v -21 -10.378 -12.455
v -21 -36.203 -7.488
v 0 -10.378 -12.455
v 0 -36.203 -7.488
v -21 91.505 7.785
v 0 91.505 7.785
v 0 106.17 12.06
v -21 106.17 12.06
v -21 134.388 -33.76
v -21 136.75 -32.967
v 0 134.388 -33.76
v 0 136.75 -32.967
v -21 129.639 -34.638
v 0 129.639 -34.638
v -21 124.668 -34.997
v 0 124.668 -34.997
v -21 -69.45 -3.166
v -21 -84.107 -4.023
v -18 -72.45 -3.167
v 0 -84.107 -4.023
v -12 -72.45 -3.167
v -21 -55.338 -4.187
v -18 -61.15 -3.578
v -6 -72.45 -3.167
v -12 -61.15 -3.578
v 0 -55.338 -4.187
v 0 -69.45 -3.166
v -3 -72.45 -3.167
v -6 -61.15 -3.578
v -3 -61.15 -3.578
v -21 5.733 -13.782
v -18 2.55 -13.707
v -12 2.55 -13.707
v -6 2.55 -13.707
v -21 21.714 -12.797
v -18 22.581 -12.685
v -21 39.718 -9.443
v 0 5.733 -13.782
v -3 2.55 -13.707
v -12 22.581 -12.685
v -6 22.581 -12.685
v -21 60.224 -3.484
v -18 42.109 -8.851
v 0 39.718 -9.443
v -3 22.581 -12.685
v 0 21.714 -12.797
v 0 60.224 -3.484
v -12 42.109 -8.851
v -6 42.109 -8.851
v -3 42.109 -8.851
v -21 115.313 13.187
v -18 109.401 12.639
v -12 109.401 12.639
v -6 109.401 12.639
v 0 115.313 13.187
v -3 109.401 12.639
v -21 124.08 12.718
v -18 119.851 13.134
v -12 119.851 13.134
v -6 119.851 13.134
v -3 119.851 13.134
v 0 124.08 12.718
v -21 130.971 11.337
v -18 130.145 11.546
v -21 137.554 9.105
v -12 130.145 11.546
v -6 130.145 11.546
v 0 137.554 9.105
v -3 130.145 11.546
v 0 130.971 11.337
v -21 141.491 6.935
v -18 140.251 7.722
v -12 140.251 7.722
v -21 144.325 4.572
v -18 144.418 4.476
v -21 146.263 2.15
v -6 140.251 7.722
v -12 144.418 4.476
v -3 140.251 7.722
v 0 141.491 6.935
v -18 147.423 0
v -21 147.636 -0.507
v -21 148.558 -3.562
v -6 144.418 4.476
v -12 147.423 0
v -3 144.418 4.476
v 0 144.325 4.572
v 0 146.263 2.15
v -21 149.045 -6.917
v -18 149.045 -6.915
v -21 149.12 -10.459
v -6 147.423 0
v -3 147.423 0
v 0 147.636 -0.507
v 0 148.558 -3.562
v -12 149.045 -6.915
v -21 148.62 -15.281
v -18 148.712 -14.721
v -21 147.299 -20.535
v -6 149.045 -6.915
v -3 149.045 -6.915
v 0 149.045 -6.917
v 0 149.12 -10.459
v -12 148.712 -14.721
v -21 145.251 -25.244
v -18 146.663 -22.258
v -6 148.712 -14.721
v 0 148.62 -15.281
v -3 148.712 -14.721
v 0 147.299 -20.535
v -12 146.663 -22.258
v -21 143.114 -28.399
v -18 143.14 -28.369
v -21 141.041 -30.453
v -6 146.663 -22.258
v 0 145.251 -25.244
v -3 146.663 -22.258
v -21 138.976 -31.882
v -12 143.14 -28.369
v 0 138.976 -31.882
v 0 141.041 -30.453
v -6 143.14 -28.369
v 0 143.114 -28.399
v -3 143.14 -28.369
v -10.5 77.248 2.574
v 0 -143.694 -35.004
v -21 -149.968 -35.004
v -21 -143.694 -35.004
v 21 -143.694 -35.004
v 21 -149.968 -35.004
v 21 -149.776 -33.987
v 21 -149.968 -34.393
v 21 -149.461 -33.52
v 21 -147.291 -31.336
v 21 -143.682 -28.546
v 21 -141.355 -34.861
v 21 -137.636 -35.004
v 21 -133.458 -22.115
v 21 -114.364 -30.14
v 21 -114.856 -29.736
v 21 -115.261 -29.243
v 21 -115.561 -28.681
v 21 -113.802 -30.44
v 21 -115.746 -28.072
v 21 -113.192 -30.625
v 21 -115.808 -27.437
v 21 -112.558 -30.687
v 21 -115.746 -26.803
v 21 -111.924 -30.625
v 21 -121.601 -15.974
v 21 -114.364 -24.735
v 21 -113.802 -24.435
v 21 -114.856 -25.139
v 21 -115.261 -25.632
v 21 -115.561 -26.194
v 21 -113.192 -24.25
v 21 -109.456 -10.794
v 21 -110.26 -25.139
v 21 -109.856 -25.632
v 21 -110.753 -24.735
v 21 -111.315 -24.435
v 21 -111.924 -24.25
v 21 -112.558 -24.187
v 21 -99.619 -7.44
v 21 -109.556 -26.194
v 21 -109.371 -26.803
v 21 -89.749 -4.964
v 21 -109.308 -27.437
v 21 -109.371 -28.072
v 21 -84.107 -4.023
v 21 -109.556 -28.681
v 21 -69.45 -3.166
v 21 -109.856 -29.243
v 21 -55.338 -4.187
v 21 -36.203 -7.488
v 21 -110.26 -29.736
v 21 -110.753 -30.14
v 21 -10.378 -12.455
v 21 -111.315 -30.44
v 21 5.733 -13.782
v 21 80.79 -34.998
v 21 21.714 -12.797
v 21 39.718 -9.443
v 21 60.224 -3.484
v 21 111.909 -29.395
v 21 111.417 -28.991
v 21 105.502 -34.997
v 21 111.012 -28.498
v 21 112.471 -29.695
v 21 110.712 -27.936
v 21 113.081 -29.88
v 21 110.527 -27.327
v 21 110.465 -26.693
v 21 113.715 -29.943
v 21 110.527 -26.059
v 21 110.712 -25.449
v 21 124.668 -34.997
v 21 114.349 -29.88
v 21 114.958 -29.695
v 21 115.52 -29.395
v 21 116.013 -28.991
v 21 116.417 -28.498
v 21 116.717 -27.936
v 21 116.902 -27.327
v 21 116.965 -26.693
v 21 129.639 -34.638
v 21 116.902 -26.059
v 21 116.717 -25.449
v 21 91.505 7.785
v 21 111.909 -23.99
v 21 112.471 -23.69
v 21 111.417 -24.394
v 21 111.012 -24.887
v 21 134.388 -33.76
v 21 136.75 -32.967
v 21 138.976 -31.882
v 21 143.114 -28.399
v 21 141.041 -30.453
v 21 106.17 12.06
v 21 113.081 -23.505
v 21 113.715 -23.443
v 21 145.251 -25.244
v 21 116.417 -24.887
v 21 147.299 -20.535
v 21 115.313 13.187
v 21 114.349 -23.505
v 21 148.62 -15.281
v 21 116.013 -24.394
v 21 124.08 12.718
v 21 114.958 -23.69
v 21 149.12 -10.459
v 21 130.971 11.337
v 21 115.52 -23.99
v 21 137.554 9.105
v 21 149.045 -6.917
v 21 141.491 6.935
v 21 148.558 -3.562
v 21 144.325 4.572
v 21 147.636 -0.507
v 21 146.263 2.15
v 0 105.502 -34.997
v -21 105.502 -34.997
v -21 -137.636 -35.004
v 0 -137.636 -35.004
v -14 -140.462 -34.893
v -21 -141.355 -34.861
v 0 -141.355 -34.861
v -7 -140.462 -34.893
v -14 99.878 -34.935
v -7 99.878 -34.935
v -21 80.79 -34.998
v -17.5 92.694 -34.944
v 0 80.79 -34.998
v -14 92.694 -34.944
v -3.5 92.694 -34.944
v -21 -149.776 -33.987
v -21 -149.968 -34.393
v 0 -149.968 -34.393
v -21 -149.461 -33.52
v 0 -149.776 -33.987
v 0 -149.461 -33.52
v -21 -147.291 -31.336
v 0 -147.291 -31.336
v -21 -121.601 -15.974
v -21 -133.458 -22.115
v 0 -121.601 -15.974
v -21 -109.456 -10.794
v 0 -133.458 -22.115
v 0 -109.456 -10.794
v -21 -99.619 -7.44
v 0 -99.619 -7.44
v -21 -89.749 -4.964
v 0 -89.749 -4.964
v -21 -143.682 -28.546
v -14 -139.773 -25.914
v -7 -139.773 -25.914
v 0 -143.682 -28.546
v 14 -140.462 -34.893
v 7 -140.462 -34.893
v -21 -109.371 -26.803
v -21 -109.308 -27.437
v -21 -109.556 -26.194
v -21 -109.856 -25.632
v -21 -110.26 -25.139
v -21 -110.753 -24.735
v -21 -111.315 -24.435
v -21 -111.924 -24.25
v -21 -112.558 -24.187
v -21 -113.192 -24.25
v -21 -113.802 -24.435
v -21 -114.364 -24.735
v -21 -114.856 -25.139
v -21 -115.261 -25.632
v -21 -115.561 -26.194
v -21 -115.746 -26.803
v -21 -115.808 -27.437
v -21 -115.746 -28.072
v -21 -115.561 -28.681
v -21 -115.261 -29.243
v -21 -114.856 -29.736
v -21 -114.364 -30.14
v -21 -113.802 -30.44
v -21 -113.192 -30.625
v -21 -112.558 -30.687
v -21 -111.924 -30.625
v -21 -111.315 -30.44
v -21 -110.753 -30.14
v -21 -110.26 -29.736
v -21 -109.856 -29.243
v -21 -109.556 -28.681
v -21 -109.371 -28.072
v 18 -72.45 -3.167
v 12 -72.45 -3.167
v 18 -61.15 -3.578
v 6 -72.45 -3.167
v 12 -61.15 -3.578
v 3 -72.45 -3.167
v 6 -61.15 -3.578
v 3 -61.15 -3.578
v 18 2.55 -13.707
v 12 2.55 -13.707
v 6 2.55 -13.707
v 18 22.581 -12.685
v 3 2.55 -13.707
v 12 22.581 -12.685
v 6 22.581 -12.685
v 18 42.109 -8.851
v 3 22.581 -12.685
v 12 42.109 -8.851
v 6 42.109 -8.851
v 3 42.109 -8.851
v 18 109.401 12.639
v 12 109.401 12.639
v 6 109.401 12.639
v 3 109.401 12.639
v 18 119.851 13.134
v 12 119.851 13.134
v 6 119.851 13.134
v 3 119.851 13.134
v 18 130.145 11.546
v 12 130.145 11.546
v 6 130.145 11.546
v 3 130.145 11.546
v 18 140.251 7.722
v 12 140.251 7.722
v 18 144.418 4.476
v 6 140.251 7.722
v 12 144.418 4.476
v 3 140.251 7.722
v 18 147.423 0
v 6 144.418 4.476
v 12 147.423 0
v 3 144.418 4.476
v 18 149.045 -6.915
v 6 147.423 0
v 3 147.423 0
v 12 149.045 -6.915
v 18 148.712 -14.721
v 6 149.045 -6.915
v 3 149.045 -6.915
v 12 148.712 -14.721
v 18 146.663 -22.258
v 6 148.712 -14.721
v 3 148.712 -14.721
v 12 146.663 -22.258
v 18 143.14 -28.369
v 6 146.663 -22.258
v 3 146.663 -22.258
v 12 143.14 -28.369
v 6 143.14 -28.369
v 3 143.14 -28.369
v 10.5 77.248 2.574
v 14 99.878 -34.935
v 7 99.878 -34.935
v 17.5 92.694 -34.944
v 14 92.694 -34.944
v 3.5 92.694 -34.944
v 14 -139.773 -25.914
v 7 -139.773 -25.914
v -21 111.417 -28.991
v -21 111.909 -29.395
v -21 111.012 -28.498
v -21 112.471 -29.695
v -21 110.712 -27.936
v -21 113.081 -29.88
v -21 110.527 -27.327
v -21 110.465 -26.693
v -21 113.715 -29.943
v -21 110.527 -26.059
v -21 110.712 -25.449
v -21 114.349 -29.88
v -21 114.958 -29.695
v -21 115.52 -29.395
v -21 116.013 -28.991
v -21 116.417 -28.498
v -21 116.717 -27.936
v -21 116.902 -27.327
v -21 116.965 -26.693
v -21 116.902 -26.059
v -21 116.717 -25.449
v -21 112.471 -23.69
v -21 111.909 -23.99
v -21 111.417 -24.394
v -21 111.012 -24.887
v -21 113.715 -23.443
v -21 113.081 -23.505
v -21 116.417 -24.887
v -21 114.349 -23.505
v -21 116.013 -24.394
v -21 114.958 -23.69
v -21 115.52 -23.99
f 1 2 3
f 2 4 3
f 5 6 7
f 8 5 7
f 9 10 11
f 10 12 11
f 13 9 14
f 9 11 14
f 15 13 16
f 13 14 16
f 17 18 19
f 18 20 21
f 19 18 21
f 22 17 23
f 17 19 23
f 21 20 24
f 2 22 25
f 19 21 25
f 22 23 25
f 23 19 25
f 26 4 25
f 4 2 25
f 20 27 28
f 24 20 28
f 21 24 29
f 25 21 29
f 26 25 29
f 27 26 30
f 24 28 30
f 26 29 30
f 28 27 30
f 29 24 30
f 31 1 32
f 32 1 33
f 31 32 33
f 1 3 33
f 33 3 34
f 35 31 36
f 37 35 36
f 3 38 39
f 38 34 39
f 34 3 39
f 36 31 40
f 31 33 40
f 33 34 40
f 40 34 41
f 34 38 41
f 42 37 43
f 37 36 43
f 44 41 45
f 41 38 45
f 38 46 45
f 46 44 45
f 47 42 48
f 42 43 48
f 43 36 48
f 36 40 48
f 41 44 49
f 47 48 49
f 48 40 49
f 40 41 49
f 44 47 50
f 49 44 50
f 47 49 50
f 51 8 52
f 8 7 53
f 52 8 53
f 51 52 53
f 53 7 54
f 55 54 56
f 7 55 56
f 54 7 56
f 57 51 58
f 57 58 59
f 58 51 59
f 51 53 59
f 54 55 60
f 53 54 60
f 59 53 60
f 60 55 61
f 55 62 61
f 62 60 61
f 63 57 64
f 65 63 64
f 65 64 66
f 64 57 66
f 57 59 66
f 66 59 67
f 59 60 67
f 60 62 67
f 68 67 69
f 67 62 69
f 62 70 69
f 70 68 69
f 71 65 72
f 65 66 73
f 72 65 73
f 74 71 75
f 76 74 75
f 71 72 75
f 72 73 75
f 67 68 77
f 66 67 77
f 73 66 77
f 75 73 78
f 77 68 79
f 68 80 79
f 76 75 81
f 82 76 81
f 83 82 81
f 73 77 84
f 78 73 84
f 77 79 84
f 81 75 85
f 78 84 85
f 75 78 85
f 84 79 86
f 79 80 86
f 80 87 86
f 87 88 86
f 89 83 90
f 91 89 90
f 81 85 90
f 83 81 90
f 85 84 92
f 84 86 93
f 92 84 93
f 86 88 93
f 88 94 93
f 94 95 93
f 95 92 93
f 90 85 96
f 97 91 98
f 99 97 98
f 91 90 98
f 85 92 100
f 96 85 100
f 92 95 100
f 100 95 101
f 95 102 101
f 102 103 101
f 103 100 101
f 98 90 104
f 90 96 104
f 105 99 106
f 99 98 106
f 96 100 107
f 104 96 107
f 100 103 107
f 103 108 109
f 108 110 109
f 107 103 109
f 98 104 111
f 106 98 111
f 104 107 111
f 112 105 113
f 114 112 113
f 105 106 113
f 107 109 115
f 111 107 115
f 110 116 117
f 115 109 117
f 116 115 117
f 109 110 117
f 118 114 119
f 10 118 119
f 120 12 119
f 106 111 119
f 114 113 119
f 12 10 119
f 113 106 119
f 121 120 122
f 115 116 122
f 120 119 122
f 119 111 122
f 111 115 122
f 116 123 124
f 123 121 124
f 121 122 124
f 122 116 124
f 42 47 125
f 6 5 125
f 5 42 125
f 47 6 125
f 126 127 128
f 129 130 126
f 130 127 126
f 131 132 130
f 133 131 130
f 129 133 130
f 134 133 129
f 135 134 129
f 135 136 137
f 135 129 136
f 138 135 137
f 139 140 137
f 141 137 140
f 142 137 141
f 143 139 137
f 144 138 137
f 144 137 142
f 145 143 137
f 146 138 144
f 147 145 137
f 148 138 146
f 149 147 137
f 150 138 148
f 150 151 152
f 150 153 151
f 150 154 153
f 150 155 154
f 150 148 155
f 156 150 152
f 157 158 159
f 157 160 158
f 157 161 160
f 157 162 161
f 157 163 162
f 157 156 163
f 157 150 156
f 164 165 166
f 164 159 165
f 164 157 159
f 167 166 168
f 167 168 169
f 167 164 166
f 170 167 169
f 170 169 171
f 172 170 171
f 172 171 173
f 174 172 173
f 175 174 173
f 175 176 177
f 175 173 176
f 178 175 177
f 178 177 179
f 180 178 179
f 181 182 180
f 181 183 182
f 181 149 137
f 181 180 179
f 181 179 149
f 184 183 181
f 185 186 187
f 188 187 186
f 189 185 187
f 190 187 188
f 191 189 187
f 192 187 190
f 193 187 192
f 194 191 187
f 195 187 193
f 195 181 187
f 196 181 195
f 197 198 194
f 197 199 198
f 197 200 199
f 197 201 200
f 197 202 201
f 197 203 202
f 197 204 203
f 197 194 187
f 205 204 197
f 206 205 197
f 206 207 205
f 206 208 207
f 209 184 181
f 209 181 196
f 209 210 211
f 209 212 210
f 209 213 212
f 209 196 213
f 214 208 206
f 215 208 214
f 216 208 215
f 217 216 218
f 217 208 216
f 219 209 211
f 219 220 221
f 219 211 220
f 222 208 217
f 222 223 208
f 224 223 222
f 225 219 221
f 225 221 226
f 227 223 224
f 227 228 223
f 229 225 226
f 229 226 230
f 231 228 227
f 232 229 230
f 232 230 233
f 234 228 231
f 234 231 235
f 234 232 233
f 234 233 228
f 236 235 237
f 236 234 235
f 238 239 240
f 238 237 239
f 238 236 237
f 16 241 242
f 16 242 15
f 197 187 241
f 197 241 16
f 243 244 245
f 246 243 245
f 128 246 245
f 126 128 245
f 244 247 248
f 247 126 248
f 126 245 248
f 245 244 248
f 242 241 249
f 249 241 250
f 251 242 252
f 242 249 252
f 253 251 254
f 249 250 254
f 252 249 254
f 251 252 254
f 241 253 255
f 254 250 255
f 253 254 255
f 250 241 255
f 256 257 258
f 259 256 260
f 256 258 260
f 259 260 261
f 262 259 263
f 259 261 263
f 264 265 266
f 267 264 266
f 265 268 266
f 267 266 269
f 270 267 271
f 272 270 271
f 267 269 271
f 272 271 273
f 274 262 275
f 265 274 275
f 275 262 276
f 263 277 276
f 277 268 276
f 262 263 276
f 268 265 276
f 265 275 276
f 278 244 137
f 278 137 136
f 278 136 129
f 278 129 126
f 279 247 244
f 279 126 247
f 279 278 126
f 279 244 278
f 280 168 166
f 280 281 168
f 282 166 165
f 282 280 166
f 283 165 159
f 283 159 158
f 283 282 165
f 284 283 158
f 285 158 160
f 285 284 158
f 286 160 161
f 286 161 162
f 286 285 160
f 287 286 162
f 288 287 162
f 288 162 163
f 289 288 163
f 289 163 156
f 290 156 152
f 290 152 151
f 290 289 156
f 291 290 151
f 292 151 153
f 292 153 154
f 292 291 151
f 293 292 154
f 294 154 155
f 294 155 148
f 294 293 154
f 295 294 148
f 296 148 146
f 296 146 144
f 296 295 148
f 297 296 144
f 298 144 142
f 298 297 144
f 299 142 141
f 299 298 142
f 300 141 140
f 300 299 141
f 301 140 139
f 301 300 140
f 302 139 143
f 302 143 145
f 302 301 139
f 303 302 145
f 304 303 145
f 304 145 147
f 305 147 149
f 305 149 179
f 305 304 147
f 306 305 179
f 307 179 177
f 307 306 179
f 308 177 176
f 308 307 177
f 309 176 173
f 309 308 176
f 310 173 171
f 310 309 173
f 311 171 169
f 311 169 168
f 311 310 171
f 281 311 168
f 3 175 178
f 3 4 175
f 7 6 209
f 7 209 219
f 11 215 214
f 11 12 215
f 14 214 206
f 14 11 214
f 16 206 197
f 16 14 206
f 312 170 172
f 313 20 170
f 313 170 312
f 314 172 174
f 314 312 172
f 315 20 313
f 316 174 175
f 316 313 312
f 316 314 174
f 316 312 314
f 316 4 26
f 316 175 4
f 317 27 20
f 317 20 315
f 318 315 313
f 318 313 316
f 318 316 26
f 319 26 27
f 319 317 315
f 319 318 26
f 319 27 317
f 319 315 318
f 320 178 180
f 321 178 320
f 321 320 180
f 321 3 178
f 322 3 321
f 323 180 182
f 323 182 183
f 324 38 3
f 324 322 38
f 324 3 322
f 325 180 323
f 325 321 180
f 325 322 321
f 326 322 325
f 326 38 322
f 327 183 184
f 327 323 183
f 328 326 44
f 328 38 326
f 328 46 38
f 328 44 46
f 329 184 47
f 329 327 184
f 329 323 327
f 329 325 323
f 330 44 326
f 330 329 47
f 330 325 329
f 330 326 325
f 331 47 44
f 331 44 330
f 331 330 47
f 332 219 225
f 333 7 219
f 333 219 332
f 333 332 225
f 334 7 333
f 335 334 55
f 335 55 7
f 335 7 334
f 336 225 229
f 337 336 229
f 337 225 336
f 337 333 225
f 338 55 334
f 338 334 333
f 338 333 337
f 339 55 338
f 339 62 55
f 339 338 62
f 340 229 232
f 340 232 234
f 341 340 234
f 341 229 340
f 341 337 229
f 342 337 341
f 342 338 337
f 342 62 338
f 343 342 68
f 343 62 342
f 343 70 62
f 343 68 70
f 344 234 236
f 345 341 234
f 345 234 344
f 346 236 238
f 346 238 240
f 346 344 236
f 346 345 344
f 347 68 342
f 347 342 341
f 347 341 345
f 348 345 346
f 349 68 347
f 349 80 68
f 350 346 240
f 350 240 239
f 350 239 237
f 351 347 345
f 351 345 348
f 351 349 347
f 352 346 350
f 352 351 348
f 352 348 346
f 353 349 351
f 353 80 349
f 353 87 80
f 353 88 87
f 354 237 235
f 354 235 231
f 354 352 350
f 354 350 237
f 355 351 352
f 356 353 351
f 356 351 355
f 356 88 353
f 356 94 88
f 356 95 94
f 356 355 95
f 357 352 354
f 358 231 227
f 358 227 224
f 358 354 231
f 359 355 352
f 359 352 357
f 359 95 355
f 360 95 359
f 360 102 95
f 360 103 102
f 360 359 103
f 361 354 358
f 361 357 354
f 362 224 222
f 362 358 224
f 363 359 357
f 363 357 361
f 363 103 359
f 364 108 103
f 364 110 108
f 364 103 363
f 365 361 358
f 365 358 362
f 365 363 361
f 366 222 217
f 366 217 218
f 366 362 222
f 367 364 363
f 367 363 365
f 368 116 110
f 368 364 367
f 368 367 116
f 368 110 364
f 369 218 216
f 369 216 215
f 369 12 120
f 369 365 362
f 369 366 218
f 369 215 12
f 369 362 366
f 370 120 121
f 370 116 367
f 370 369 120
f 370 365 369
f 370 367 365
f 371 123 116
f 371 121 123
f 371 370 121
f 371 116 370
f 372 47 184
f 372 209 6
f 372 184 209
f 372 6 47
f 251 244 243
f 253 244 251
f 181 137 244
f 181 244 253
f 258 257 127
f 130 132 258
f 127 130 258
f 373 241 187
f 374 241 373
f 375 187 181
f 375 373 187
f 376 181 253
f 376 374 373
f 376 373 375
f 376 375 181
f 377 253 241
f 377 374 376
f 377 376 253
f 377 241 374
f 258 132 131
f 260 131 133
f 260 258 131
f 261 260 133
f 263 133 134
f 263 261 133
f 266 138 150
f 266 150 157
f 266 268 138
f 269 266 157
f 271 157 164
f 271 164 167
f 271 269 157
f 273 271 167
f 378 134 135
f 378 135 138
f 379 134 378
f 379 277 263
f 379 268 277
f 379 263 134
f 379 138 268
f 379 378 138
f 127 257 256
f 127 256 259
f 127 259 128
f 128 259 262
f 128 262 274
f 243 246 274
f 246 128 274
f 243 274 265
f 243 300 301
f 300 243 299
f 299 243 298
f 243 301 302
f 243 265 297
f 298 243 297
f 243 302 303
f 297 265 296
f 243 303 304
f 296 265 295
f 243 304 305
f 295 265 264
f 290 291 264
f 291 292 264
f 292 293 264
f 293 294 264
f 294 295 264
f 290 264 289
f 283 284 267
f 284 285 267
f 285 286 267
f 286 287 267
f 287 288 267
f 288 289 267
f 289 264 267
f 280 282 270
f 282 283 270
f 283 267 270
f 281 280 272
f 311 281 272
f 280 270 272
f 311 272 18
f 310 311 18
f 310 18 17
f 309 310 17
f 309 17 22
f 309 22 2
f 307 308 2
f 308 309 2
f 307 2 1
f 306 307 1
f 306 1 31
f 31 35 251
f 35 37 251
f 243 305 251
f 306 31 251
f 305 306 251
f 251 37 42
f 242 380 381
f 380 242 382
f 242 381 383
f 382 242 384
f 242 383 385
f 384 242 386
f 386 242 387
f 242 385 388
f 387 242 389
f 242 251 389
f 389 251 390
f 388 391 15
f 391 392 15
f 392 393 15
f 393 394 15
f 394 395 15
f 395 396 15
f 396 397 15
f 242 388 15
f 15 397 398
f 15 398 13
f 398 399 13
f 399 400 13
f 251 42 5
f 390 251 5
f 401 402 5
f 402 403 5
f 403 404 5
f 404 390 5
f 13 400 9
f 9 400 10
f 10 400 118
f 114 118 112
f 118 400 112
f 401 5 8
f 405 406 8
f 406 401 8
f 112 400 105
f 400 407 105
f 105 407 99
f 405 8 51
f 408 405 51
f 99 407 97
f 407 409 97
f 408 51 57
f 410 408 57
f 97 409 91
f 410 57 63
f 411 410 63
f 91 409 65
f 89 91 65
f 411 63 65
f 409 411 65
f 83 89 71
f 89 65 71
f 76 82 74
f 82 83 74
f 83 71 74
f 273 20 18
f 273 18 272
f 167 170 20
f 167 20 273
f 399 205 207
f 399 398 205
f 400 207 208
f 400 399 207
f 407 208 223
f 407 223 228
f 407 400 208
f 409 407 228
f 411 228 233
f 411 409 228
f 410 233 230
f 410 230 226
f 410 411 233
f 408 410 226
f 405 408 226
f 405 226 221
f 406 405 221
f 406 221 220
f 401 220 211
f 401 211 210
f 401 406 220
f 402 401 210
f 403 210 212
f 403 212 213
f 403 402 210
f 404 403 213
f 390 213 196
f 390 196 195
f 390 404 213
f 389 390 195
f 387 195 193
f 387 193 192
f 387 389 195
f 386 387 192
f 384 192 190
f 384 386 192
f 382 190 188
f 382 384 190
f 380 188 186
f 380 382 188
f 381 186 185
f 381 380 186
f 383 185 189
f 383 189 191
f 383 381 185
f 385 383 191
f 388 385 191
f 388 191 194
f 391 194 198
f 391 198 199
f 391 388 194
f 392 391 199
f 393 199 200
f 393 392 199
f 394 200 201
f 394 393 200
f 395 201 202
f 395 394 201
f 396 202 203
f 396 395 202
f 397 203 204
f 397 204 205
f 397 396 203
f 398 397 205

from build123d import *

# Parameters (mm, degrees)
F0_R     = 3.25
F1_DEPTH = 21


with BuildPart() as f1:
    # F0 (on Right) → F1 (new body, symmetric)
    with BuildSketch(Plane.YZ):
        with BuildLine():
            Line((105.502113587, -34.9971709955), (124.668445329, -34.9966570689))
            add(Edge.make_bspline(
                [(-84.1072786547, -4.0229004557), (-52.4883370175, 0.2504227513), (0.6548018517, -24.9080376876), (75.0778261275, 1.4864868471), (108.0448382237, 14.3124525772), (129.8142395832, 12.7833679801), (152.9400135074, 3.4476002031), (146.8252167679, -32.9191382622), (131.6688854886, -34.6988186379), (124.6684453291, -34.9966570689)],
                knots=[0.1087070662, 0.1087070662, 0.1087070662, 0.1087070662, 0.2218036192, 0.3300961655, 0.4029947998, 0.4596801521, 0.516387108, 0.5830113223, 0.6381126975, 0.6381126975, 0.6381126975, 0.6381126975], degree=3))
            Line((-84.1072786547, -4.0229004557), (-89.7489796886, -4.963531308))
            add(Edge.make_bspline(
                [(-149.9678401013, -34.3928262286), (-148.3763412579, -29.743278927), (-117.3086455998, -10.4418294624), (-89.7489796886, -4.963531308)],
                knots=[0.0051320026, 0.0051320026, 0.0051320026, 0.0051320026, 0.1020374295, 0.1020374295, 0.1020374295, 0.1020374295], degree=3))
            Line((-149.9678401013, -34.3928262286), (-149.9677823067, -35.0040211728))
            Line((-149.9677823067, -35.0040211728), (-143.6944173157, -35.0038529586))
            add(Edge.make_bspline(
                [(-137.6362800843, -35.0036905156), (-141.4446271329, -34.8875220902), (-141.7263823323, -34.7382054392), (-143.6944173157, -35.0038529586)],
                knots=[0.9382308353, 0.9382308353, 0.9382308353, 0.9382308353, 0.9688458752, 0.9688458752, 0.9688458752, 0.9688458752], degree=3))
            Line((-137.6362800844, -35.0036905156), (80.7900474102, -34.9978336255))
            add(Edge.make_bspline(
                [(105.502113587, -34.9971709955), (99.6050333425, -34.8924174164), (96.1077557334, -34.9286169051), (80.7900474103, -34.9978336255)],
                knots=[0.6925673232, 0.6925673232, 0.6925673232, 0.6925673232, 0.7544002504, 0.7544002504, 0.7544002504, 0.7544002504], degree=3))
        make_face()
        with Locations((-112.5583052635, -27.4374913424)):
            Circle(F0_R, mode=Mode.SUBTRACT)
        with Locations((113.7147694826, -26.6925599426)):
            Circle(F0_R, mode=Mode.SUBTRACT)
    extrude(amount=F1_DEPTH, both=True)


solid = f1.part
